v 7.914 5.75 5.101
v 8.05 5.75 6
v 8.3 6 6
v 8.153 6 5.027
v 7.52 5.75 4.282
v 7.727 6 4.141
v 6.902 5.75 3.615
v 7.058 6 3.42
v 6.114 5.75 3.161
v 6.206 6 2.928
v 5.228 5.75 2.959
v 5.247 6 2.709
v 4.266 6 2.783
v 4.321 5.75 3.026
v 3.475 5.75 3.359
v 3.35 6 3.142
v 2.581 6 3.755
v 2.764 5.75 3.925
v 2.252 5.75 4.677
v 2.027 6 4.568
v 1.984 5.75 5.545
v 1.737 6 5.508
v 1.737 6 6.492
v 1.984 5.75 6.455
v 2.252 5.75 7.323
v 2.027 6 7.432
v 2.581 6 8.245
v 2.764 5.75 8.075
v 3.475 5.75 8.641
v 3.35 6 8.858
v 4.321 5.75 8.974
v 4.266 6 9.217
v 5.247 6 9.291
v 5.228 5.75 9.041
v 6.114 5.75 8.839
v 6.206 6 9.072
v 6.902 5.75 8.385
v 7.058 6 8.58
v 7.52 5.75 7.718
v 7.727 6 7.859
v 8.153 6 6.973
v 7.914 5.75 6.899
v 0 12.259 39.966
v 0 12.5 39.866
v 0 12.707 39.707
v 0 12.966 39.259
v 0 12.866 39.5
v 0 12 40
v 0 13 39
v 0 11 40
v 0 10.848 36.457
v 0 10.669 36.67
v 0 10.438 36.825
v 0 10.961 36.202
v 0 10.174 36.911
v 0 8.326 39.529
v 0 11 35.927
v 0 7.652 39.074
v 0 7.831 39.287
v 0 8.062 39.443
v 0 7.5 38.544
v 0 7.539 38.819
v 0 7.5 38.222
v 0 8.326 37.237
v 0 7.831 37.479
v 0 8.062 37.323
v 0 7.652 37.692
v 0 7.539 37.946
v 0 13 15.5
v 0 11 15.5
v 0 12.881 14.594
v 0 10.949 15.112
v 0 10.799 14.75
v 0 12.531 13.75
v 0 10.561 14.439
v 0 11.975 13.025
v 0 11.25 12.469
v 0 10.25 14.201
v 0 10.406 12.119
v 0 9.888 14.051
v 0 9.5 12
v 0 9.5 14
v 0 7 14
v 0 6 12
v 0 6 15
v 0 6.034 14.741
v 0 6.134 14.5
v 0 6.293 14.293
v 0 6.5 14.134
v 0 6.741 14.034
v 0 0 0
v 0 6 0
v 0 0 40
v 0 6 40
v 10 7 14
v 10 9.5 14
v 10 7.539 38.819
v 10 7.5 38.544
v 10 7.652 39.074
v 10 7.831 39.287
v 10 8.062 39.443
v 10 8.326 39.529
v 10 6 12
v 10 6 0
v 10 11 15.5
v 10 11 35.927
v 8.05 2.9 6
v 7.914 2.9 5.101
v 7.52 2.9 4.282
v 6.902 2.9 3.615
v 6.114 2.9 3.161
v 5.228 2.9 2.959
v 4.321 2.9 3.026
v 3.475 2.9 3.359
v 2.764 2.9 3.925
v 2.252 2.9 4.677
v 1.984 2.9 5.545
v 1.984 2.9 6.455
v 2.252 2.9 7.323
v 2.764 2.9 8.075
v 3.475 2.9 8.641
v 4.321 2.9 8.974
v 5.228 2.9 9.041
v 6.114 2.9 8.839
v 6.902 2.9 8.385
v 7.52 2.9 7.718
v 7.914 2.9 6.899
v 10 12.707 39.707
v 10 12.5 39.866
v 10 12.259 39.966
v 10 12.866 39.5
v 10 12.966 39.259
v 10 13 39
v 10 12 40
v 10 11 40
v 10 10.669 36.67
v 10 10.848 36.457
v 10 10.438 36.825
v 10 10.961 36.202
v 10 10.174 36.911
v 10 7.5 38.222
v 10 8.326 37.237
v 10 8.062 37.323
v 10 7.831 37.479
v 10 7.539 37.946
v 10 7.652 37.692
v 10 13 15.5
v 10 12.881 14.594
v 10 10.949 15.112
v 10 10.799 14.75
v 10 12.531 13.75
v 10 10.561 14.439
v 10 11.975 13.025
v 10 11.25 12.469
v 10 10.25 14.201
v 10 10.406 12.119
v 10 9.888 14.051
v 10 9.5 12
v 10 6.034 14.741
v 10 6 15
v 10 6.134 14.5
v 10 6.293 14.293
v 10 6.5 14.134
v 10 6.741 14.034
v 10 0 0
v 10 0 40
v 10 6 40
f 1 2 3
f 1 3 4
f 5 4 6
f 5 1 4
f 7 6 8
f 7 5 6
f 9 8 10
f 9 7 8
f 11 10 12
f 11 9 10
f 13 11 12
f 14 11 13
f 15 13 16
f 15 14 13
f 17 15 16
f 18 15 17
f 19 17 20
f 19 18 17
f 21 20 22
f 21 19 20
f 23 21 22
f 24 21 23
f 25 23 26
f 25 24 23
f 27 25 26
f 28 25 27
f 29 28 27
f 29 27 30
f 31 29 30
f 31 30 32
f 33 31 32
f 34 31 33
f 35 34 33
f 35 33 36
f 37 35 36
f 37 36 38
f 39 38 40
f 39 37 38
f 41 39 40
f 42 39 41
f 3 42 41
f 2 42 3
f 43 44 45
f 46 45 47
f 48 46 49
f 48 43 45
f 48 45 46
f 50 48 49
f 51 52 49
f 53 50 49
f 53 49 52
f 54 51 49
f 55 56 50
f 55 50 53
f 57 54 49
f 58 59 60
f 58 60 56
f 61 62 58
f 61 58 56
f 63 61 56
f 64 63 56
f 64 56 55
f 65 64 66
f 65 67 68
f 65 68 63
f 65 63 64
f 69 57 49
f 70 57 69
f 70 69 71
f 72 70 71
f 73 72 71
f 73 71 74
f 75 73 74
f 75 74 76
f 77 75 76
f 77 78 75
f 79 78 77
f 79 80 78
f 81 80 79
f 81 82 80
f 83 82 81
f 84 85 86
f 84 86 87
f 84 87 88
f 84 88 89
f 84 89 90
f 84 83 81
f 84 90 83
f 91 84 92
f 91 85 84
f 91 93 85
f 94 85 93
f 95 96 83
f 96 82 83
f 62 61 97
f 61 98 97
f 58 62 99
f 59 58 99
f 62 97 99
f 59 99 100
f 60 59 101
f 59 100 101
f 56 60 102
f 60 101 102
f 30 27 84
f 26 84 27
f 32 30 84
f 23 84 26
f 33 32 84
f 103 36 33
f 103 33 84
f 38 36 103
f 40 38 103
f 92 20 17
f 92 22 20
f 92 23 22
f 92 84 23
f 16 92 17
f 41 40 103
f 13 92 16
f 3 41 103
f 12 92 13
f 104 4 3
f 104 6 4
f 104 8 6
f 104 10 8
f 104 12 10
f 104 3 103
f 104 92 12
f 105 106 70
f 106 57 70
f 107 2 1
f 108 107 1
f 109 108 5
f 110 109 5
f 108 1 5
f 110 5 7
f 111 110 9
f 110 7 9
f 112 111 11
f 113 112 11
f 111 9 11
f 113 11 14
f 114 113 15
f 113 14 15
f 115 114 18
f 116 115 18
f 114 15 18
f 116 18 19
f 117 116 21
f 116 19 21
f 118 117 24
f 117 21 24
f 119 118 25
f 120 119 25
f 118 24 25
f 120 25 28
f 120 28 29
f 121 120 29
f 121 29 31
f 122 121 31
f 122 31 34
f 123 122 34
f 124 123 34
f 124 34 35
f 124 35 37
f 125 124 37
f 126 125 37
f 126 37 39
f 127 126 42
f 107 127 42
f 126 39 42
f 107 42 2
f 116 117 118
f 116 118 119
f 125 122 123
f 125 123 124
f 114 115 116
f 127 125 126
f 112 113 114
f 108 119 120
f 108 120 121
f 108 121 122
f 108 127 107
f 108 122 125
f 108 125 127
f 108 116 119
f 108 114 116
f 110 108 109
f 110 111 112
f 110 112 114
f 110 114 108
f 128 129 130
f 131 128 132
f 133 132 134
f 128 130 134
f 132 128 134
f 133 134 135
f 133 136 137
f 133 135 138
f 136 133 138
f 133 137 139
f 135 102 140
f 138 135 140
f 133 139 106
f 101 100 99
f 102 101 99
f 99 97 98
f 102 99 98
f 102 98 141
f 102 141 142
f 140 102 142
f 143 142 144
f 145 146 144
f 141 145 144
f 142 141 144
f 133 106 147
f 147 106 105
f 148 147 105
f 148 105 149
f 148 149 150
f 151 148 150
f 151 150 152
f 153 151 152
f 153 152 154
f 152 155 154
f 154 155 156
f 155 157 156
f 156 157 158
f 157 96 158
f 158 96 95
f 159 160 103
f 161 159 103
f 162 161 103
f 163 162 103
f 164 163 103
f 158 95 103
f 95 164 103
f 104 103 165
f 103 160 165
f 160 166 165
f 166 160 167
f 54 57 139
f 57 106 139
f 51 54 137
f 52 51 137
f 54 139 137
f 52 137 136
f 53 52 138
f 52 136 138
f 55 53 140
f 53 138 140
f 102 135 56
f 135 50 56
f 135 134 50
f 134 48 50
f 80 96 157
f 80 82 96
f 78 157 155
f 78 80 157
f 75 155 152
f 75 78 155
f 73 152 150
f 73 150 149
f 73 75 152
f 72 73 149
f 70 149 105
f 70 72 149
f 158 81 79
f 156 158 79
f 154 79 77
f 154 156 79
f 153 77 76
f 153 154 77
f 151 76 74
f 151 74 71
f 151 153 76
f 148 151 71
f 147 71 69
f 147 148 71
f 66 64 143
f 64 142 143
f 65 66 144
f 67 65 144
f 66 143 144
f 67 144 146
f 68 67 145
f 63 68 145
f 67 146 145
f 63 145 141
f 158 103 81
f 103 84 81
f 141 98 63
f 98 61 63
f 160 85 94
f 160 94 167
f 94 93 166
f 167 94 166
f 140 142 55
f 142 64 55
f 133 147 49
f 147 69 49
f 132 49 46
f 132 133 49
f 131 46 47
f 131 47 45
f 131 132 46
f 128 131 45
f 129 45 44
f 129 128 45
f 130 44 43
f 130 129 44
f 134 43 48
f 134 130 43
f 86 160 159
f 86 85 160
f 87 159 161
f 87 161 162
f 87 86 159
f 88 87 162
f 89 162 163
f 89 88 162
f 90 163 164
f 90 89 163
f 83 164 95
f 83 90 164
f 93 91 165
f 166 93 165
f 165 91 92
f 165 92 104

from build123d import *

# Parameters (mm, degrees)
SKETCH1_W           = 10
SKETCH1_H           = 40
BOSS_EXTRUDE1_DEPTH = 6
SKETCH2_R           = 3.05
CUT_EXTRUDE1_DEPTH  = 3.1
CHAMFER1_SIZE       = 0.25
BOSS_EXTRUDE2_DEPTH = 5
FILLET1_R           = 1.5
FILLET2_R           = 3.5
FILLET3_R           = 1
FILLET4_R           = 1


with BuildPart() as part:
    # Sketch1 → Boss-Extrude1 (new body)
    with BuildSketch(Plane(origin=(0, 0, 0), x_dir=(1, 0, 0), z_dir=(0, 1, 0))):
        with Locations((5, -20)):
            Rectangle(SKETCH1_W, SKETCH1_H)
    extrude(amount=BOSS_EXTRUDE1_DEPTH)

    # Sketch2 → Cut-Extrude1 (cut)
    with BuildSketch(Plane(origin=(0, 6, 0), x_dir=(1, 0, 0), z_dir=(0, 1, 0))):
        with Locations((5, -6)):
            Circle(SKETCH2_R)
    extrude(amount=-CUT_EXTRUDE1_DEPTH, mode=Mode.SUBTRACT)

    # Chamfer1
    chamfer1_edges = [part.edges().sort_by_distance(p)[0] for p in [
        (1.95, 6, 6),
    ]]
    chamfer(chamfer1_edges, length=CHAMFER1_SIZE)

    # Sketch4 → Boss-Extrude2 (add, symmetric)
    with BuildSketch(Plane.ZY.offset(-5)):
        Polygon((12, 6), (12, 13), (40, 13), (40, 11), (39.382855568, 7.5), (37.382855568, 7.5), (36.765711135, 11), (14, 11), (14, 6), align=None)
    extrude(amount=BOSS_EXTRUDE2_DEPTH, both=True)

    # Fillet1
    fillet1_edges = [part.edges().sort_by_distance(p)[0] for p in [
        (5, 11, 14),
    ]]
    fillet(fillet1_edges, radius=FILLET1_R)

    # Fillet2
    fillet2_edges = [part.edges().sort_by_distance(p)[0] for p in [
        (5, 13, 12),
    ]]
    fillet(fillet2_edges, radius=FILLET2_R)

    # Fillet3
    fillet3_edges = [part.edges().sort_by_distance(p)[0] for p in [
        (5, 6, 14),
    ]]
    fillet(fillet3_edges, radius=FILLET3_R)

    # Fillet4
    fillet4_edges = [part.edges().sort_by_distance(p)[0] for p in [
        (5, 11, 36.765711135),
        (5, 7.5, 37.382855568),
        (5, 7.5, 39.382855568),
        (5, 13, 40),
    ]]
    fillet(fillet4_edges, radius=FILLET4_R)


solid = part.part
